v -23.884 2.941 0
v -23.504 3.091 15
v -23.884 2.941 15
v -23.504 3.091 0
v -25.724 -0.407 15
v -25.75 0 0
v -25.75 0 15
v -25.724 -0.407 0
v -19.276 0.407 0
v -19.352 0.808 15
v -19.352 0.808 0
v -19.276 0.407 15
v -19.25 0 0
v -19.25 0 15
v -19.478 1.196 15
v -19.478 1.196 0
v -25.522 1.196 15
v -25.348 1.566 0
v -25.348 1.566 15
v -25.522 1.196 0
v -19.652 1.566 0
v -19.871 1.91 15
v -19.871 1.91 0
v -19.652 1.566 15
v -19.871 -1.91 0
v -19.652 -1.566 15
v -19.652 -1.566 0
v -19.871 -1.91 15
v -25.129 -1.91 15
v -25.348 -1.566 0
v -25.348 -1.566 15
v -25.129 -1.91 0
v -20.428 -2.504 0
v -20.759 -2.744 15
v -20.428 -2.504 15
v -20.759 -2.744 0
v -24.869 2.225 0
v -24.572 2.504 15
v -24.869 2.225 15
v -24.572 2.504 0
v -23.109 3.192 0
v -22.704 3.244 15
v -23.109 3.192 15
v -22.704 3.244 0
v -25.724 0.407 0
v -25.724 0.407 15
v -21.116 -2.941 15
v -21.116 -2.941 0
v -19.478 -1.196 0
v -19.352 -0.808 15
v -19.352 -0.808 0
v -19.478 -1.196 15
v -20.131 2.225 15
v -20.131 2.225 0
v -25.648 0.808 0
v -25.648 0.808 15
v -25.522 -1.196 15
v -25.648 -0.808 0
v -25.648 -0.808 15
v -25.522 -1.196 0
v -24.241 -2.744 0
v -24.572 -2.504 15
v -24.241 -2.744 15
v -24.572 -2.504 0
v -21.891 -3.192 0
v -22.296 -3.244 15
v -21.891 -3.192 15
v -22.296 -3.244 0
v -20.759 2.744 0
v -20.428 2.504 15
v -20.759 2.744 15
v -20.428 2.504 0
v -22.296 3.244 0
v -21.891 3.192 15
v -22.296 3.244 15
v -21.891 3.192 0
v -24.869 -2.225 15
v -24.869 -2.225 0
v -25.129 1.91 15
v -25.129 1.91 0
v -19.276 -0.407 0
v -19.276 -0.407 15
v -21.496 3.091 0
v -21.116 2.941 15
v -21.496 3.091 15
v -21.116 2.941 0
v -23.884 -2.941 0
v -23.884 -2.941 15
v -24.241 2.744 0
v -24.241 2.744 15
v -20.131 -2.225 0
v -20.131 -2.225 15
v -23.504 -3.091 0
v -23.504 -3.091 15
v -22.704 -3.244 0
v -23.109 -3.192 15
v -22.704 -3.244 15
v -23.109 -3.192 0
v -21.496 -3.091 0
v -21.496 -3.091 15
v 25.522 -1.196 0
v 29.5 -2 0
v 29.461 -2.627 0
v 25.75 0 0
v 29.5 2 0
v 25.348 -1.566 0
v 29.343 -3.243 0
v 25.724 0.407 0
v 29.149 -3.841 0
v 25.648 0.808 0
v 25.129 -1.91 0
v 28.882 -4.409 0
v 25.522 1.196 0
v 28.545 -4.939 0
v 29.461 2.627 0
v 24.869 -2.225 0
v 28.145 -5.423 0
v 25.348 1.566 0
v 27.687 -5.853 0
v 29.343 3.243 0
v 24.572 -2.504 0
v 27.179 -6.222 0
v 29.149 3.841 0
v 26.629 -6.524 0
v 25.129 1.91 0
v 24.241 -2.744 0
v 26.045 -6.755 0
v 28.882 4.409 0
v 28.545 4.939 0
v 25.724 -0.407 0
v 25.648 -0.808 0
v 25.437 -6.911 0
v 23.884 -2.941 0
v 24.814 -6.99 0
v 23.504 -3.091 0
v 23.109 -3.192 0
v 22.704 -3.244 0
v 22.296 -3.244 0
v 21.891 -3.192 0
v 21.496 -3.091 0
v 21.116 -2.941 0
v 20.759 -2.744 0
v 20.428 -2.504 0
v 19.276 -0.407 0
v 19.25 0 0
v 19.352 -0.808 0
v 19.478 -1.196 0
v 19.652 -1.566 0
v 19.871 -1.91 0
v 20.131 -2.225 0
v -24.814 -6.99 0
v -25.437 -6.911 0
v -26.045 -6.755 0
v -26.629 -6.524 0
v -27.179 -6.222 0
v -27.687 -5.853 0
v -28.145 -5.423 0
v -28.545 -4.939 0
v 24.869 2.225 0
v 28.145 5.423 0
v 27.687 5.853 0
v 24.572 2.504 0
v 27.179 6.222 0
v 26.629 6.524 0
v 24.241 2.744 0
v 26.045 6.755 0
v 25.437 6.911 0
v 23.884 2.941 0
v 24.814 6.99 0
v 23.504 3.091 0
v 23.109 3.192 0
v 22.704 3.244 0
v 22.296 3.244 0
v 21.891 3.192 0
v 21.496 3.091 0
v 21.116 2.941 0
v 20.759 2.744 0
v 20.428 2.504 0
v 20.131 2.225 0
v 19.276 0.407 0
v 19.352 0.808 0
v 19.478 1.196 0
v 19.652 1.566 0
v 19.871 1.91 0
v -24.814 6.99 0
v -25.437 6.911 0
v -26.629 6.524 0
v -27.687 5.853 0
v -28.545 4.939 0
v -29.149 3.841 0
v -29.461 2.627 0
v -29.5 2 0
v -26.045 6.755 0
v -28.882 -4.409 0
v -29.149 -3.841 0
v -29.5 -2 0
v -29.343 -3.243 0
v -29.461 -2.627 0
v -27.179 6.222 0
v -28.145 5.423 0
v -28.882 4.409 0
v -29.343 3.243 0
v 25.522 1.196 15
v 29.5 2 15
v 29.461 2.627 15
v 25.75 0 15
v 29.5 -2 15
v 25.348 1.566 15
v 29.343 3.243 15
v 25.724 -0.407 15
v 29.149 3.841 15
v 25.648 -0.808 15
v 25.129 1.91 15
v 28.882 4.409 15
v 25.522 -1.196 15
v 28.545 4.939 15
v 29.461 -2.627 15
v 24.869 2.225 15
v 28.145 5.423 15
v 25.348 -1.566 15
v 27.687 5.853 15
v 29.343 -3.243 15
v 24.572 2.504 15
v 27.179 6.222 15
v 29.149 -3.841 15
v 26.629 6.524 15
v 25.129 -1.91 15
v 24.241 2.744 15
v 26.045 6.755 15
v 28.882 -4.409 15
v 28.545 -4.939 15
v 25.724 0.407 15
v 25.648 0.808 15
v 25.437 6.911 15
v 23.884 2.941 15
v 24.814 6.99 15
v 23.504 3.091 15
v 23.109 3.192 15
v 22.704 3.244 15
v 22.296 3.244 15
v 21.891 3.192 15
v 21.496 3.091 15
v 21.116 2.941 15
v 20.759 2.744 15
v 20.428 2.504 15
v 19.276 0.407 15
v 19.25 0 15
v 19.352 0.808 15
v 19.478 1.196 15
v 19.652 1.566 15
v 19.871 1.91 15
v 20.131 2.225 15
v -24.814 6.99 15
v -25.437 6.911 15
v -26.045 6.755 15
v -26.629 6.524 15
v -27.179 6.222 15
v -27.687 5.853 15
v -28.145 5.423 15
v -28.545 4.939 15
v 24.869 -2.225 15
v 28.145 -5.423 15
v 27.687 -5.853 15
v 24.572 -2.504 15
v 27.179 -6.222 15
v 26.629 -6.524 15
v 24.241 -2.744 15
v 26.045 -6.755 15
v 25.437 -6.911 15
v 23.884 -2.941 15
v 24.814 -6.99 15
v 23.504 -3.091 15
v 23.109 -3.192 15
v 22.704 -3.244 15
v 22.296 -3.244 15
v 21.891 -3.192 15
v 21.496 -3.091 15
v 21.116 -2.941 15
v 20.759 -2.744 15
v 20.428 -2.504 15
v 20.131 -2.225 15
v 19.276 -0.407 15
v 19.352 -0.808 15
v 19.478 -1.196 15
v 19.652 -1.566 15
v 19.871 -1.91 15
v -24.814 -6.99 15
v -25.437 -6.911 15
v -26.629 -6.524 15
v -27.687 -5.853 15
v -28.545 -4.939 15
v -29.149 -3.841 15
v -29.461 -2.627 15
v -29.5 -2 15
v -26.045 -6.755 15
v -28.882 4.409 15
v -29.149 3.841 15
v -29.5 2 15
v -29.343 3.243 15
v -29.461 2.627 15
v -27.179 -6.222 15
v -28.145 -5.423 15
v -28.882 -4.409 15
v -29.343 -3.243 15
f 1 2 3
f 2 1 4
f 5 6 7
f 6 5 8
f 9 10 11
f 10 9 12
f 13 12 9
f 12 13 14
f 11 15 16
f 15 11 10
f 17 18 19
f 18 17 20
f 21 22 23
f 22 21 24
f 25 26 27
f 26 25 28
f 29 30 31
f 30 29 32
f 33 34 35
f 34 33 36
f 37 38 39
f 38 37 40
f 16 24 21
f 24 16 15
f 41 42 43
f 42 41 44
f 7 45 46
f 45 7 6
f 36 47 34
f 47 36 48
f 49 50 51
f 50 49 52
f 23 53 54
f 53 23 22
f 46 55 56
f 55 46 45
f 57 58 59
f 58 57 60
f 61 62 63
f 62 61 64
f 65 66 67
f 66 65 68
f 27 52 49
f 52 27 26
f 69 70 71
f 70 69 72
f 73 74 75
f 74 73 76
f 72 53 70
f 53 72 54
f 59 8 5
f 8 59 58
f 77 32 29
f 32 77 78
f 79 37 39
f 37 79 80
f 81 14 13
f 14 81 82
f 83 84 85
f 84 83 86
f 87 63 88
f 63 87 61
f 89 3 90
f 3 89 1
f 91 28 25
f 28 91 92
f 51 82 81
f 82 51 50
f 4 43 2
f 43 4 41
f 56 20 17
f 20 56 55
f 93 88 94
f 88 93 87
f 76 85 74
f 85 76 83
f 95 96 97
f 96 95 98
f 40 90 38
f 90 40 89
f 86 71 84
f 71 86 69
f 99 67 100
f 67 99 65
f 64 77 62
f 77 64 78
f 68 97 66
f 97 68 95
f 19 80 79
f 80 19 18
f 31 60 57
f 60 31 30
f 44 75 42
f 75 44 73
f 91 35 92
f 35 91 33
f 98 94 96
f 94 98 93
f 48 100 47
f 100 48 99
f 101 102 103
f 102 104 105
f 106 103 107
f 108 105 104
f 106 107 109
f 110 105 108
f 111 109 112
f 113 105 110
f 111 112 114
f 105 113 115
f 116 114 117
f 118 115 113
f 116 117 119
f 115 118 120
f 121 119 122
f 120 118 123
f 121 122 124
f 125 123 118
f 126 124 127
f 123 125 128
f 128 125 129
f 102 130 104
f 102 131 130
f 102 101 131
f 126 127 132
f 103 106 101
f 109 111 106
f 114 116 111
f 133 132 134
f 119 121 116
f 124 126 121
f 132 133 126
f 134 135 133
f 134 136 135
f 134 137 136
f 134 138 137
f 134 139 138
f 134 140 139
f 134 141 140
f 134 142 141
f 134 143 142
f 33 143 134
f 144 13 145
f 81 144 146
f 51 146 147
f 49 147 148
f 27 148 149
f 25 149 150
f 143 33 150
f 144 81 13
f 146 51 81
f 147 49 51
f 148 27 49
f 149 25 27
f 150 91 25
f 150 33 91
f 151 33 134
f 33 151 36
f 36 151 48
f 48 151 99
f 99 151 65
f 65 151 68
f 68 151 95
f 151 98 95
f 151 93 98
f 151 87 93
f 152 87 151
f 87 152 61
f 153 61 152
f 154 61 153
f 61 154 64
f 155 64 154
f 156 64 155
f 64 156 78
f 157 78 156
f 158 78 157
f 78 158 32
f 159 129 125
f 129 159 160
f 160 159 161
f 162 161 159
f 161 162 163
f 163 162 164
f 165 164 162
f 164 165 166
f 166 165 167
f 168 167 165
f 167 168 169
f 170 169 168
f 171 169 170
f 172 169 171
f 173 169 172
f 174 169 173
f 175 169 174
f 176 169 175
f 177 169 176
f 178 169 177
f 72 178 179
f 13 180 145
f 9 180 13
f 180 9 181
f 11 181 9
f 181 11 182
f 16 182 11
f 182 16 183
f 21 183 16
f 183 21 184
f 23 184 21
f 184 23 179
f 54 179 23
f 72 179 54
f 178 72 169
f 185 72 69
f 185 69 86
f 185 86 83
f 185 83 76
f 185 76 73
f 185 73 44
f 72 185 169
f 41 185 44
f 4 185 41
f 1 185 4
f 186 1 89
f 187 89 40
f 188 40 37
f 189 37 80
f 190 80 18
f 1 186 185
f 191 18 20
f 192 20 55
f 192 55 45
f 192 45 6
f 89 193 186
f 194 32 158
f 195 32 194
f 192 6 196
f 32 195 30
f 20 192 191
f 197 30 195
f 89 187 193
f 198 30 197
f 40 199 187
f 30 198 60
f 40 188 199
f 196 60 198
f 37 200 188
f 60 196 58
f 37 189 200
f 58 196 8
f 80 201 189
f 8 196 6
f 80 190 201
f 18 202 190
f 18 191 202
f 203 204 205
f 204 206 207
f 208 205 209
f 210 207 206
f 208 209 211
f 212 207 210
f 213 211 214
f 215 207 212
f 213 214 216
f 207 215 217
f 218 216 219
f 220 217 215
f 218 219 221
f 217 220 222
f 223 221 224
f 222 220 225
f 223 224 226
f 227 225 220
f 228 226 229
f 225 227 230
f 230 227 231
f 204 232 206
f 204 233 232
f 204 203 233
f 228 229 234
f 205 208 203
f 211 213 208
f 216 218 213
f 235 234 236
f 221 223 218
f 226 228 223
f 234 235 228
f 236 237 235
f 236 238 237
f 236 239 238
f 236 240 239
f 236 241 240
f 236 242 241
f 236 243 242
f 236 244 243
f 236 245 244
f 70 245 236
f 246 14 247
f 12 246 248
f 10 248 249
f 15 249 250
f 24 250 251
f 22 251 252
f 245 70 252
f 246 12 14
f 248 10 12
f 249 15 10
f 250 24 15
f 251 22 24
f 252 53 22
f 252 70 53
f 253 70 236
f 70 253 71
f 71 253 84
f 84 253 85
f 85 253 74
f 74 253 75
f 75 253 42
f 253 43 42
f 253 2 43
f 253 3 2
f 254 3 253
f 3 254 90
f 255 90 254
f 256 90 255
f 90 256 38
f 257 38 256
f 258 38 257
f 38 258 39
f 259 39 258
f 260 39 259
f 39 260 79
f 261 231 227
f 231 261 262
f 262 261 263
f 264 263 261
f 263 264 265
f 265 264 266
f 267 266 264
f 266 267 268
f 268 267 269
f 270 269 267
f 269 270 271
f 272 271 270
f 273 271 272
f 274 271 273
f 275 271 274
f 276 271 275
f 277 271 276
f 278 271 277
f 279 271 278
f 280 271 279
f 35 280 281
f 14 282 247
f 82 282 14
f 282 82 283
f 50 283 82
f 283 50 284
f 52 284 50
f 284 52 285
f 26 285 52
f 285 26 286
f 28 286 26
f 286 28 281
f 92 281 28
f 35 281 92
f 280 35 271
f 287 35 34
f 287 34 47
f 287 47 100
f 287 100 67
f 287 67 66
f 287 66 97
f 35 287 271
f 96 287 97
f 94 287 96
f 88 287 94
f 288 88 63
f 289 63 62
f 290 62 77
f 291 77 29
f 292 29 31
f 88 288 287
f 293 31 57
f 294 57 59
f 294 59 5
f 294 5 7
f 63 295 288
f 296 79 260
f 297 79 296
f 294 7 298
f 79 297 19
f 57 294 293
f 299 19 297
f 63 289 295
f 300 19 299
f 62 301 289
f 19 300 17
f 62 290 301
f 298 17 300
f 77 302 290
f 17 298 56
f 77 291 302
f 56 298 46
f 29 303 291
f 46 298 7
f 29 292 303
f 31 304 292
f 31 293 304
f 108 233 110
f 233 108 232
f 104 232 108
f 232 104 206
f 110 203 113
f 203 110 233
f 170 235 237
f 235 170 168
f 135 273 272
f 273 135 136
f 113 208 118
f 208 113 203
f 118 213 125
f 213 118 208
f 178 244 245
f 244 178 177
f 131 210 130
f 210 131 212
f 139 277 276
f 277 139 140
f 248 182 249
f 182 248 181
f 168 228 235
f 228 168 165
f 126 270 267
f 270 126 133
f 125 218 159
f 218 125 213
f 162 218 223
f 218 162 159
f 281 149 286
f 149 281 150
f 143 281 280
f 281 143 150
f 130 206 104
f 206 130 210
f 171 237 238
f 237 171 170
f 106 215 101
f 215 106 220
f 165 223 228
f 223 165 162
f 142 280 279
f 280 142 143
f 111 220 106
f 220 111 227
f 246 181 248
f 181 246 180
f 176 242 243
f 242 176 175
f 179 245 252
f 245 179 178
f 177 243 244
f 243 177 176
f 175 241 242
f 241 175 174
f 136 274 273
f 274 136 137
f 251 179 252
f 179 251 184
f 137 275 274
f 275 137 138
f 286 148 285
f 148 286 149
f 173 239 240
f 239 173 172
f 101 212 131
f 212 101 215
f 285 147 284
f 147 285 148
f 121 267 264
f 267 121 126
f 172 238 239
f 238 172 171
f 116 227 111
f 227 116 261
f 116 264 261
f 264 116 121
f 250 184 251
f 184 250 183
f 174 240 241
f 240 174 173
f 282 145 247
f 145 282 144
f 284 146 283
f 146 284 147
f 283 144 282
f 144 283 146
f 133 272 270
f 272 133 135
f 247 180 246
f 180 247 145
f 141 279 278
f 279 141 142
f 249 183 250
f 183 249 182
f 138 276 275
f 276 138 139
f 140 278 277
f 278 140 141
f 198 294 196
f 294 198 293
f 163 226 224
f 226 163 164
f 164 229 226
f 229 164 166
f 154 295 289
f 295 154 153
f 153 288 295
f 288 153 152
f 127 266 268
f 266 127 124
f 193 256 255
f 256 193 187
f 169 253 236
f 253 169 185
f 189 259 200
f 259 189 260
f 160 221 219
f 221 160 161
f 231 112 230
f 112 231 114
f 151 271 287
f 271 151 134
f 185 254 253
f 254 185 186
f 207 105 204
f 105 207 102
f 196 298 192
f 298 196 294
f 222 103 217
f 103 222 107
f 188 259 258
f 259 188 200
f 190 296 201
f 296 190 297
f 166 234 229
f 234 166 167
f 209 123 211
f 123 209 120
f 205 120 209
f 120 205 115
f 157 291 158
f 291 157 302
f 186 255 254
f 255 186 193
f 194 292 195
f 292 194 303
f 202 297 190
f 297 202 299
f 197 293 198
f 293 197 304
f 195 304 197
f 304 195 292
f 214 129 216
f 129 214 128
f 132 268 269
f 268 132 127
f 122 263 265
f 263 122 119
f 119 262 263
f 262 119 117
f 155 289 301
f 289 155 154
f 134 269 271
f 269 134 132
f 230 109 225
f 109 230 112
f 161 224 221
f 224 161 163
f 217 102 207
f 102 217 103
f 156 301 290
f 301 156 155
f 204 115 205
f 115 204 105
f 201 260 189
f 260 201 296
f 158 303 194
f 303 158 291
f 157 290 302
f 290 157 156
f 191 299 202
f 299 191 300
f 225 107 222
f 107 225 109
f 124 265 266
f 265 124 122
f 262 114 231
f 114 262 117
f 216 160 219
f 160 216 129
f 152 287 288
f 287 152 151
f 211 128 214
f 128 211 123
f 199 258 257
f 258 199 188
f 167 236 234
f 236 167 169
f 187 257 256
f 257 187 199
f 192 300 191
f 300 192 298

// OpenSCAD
$fn = 50;


difference() {
	union() {
		hull() {
			translate(v = [-24.5000000000, 2.0000000000, 0]) {
				cylinder(h = 15, r = 5);
			}
			translate(v = [24.5000000000, 2.0000000000, 0]) {
				cylinder(h = 15, r = 5);
			}
			translate(v = [-24.5000000000, -2.0000000000, 0]) {
				cylinder(h = 15, r = 5);
			}
			translate(v = [24.5000000000, -2.0000000000, 0]) {
				cylinder(h = 15, r = 5);
			}
		}
	}
	union() {
		translate(v = [-22.5000000000, 0.0000000000, 0]) {
			cylinder(h = 15, r = 3.2500000000);
		}
		translate(v = [22.5000000000, 0.0000000000, 0]) {
			cylinder(h = 15, r = 3.2500000000);
		}
		translate(v = [-22.5000000000, 0.0000000000, 0]) {
			cylinder(h = 15, r = 1.8000000000);
		}
		translate(v = [22.5000000000, 0.0000000000, 0]) {
			cylinder(h = 15, r = 1.8000000000);
		}
		translate(v = [-22.5000000000, 0.0000000000, 0]) {
			cylinder(h = 15, r = 1.8000000000);
		}
		translate(v = [22.5000000000, 0.0000000000, 0]) {
			cylinder(h = 15, r = 1.8000000000);
		}
		translate(v = [-22.5000000000, 0.0000000000, 0]) {
			cylinder(h = 15, r = 1.8000000000);
		}
		translate(v = [22.5000000000, 0.0000000000, 0]) {
			cylinder(h = 15, r = 1.8000000000);
		}
	}
}
